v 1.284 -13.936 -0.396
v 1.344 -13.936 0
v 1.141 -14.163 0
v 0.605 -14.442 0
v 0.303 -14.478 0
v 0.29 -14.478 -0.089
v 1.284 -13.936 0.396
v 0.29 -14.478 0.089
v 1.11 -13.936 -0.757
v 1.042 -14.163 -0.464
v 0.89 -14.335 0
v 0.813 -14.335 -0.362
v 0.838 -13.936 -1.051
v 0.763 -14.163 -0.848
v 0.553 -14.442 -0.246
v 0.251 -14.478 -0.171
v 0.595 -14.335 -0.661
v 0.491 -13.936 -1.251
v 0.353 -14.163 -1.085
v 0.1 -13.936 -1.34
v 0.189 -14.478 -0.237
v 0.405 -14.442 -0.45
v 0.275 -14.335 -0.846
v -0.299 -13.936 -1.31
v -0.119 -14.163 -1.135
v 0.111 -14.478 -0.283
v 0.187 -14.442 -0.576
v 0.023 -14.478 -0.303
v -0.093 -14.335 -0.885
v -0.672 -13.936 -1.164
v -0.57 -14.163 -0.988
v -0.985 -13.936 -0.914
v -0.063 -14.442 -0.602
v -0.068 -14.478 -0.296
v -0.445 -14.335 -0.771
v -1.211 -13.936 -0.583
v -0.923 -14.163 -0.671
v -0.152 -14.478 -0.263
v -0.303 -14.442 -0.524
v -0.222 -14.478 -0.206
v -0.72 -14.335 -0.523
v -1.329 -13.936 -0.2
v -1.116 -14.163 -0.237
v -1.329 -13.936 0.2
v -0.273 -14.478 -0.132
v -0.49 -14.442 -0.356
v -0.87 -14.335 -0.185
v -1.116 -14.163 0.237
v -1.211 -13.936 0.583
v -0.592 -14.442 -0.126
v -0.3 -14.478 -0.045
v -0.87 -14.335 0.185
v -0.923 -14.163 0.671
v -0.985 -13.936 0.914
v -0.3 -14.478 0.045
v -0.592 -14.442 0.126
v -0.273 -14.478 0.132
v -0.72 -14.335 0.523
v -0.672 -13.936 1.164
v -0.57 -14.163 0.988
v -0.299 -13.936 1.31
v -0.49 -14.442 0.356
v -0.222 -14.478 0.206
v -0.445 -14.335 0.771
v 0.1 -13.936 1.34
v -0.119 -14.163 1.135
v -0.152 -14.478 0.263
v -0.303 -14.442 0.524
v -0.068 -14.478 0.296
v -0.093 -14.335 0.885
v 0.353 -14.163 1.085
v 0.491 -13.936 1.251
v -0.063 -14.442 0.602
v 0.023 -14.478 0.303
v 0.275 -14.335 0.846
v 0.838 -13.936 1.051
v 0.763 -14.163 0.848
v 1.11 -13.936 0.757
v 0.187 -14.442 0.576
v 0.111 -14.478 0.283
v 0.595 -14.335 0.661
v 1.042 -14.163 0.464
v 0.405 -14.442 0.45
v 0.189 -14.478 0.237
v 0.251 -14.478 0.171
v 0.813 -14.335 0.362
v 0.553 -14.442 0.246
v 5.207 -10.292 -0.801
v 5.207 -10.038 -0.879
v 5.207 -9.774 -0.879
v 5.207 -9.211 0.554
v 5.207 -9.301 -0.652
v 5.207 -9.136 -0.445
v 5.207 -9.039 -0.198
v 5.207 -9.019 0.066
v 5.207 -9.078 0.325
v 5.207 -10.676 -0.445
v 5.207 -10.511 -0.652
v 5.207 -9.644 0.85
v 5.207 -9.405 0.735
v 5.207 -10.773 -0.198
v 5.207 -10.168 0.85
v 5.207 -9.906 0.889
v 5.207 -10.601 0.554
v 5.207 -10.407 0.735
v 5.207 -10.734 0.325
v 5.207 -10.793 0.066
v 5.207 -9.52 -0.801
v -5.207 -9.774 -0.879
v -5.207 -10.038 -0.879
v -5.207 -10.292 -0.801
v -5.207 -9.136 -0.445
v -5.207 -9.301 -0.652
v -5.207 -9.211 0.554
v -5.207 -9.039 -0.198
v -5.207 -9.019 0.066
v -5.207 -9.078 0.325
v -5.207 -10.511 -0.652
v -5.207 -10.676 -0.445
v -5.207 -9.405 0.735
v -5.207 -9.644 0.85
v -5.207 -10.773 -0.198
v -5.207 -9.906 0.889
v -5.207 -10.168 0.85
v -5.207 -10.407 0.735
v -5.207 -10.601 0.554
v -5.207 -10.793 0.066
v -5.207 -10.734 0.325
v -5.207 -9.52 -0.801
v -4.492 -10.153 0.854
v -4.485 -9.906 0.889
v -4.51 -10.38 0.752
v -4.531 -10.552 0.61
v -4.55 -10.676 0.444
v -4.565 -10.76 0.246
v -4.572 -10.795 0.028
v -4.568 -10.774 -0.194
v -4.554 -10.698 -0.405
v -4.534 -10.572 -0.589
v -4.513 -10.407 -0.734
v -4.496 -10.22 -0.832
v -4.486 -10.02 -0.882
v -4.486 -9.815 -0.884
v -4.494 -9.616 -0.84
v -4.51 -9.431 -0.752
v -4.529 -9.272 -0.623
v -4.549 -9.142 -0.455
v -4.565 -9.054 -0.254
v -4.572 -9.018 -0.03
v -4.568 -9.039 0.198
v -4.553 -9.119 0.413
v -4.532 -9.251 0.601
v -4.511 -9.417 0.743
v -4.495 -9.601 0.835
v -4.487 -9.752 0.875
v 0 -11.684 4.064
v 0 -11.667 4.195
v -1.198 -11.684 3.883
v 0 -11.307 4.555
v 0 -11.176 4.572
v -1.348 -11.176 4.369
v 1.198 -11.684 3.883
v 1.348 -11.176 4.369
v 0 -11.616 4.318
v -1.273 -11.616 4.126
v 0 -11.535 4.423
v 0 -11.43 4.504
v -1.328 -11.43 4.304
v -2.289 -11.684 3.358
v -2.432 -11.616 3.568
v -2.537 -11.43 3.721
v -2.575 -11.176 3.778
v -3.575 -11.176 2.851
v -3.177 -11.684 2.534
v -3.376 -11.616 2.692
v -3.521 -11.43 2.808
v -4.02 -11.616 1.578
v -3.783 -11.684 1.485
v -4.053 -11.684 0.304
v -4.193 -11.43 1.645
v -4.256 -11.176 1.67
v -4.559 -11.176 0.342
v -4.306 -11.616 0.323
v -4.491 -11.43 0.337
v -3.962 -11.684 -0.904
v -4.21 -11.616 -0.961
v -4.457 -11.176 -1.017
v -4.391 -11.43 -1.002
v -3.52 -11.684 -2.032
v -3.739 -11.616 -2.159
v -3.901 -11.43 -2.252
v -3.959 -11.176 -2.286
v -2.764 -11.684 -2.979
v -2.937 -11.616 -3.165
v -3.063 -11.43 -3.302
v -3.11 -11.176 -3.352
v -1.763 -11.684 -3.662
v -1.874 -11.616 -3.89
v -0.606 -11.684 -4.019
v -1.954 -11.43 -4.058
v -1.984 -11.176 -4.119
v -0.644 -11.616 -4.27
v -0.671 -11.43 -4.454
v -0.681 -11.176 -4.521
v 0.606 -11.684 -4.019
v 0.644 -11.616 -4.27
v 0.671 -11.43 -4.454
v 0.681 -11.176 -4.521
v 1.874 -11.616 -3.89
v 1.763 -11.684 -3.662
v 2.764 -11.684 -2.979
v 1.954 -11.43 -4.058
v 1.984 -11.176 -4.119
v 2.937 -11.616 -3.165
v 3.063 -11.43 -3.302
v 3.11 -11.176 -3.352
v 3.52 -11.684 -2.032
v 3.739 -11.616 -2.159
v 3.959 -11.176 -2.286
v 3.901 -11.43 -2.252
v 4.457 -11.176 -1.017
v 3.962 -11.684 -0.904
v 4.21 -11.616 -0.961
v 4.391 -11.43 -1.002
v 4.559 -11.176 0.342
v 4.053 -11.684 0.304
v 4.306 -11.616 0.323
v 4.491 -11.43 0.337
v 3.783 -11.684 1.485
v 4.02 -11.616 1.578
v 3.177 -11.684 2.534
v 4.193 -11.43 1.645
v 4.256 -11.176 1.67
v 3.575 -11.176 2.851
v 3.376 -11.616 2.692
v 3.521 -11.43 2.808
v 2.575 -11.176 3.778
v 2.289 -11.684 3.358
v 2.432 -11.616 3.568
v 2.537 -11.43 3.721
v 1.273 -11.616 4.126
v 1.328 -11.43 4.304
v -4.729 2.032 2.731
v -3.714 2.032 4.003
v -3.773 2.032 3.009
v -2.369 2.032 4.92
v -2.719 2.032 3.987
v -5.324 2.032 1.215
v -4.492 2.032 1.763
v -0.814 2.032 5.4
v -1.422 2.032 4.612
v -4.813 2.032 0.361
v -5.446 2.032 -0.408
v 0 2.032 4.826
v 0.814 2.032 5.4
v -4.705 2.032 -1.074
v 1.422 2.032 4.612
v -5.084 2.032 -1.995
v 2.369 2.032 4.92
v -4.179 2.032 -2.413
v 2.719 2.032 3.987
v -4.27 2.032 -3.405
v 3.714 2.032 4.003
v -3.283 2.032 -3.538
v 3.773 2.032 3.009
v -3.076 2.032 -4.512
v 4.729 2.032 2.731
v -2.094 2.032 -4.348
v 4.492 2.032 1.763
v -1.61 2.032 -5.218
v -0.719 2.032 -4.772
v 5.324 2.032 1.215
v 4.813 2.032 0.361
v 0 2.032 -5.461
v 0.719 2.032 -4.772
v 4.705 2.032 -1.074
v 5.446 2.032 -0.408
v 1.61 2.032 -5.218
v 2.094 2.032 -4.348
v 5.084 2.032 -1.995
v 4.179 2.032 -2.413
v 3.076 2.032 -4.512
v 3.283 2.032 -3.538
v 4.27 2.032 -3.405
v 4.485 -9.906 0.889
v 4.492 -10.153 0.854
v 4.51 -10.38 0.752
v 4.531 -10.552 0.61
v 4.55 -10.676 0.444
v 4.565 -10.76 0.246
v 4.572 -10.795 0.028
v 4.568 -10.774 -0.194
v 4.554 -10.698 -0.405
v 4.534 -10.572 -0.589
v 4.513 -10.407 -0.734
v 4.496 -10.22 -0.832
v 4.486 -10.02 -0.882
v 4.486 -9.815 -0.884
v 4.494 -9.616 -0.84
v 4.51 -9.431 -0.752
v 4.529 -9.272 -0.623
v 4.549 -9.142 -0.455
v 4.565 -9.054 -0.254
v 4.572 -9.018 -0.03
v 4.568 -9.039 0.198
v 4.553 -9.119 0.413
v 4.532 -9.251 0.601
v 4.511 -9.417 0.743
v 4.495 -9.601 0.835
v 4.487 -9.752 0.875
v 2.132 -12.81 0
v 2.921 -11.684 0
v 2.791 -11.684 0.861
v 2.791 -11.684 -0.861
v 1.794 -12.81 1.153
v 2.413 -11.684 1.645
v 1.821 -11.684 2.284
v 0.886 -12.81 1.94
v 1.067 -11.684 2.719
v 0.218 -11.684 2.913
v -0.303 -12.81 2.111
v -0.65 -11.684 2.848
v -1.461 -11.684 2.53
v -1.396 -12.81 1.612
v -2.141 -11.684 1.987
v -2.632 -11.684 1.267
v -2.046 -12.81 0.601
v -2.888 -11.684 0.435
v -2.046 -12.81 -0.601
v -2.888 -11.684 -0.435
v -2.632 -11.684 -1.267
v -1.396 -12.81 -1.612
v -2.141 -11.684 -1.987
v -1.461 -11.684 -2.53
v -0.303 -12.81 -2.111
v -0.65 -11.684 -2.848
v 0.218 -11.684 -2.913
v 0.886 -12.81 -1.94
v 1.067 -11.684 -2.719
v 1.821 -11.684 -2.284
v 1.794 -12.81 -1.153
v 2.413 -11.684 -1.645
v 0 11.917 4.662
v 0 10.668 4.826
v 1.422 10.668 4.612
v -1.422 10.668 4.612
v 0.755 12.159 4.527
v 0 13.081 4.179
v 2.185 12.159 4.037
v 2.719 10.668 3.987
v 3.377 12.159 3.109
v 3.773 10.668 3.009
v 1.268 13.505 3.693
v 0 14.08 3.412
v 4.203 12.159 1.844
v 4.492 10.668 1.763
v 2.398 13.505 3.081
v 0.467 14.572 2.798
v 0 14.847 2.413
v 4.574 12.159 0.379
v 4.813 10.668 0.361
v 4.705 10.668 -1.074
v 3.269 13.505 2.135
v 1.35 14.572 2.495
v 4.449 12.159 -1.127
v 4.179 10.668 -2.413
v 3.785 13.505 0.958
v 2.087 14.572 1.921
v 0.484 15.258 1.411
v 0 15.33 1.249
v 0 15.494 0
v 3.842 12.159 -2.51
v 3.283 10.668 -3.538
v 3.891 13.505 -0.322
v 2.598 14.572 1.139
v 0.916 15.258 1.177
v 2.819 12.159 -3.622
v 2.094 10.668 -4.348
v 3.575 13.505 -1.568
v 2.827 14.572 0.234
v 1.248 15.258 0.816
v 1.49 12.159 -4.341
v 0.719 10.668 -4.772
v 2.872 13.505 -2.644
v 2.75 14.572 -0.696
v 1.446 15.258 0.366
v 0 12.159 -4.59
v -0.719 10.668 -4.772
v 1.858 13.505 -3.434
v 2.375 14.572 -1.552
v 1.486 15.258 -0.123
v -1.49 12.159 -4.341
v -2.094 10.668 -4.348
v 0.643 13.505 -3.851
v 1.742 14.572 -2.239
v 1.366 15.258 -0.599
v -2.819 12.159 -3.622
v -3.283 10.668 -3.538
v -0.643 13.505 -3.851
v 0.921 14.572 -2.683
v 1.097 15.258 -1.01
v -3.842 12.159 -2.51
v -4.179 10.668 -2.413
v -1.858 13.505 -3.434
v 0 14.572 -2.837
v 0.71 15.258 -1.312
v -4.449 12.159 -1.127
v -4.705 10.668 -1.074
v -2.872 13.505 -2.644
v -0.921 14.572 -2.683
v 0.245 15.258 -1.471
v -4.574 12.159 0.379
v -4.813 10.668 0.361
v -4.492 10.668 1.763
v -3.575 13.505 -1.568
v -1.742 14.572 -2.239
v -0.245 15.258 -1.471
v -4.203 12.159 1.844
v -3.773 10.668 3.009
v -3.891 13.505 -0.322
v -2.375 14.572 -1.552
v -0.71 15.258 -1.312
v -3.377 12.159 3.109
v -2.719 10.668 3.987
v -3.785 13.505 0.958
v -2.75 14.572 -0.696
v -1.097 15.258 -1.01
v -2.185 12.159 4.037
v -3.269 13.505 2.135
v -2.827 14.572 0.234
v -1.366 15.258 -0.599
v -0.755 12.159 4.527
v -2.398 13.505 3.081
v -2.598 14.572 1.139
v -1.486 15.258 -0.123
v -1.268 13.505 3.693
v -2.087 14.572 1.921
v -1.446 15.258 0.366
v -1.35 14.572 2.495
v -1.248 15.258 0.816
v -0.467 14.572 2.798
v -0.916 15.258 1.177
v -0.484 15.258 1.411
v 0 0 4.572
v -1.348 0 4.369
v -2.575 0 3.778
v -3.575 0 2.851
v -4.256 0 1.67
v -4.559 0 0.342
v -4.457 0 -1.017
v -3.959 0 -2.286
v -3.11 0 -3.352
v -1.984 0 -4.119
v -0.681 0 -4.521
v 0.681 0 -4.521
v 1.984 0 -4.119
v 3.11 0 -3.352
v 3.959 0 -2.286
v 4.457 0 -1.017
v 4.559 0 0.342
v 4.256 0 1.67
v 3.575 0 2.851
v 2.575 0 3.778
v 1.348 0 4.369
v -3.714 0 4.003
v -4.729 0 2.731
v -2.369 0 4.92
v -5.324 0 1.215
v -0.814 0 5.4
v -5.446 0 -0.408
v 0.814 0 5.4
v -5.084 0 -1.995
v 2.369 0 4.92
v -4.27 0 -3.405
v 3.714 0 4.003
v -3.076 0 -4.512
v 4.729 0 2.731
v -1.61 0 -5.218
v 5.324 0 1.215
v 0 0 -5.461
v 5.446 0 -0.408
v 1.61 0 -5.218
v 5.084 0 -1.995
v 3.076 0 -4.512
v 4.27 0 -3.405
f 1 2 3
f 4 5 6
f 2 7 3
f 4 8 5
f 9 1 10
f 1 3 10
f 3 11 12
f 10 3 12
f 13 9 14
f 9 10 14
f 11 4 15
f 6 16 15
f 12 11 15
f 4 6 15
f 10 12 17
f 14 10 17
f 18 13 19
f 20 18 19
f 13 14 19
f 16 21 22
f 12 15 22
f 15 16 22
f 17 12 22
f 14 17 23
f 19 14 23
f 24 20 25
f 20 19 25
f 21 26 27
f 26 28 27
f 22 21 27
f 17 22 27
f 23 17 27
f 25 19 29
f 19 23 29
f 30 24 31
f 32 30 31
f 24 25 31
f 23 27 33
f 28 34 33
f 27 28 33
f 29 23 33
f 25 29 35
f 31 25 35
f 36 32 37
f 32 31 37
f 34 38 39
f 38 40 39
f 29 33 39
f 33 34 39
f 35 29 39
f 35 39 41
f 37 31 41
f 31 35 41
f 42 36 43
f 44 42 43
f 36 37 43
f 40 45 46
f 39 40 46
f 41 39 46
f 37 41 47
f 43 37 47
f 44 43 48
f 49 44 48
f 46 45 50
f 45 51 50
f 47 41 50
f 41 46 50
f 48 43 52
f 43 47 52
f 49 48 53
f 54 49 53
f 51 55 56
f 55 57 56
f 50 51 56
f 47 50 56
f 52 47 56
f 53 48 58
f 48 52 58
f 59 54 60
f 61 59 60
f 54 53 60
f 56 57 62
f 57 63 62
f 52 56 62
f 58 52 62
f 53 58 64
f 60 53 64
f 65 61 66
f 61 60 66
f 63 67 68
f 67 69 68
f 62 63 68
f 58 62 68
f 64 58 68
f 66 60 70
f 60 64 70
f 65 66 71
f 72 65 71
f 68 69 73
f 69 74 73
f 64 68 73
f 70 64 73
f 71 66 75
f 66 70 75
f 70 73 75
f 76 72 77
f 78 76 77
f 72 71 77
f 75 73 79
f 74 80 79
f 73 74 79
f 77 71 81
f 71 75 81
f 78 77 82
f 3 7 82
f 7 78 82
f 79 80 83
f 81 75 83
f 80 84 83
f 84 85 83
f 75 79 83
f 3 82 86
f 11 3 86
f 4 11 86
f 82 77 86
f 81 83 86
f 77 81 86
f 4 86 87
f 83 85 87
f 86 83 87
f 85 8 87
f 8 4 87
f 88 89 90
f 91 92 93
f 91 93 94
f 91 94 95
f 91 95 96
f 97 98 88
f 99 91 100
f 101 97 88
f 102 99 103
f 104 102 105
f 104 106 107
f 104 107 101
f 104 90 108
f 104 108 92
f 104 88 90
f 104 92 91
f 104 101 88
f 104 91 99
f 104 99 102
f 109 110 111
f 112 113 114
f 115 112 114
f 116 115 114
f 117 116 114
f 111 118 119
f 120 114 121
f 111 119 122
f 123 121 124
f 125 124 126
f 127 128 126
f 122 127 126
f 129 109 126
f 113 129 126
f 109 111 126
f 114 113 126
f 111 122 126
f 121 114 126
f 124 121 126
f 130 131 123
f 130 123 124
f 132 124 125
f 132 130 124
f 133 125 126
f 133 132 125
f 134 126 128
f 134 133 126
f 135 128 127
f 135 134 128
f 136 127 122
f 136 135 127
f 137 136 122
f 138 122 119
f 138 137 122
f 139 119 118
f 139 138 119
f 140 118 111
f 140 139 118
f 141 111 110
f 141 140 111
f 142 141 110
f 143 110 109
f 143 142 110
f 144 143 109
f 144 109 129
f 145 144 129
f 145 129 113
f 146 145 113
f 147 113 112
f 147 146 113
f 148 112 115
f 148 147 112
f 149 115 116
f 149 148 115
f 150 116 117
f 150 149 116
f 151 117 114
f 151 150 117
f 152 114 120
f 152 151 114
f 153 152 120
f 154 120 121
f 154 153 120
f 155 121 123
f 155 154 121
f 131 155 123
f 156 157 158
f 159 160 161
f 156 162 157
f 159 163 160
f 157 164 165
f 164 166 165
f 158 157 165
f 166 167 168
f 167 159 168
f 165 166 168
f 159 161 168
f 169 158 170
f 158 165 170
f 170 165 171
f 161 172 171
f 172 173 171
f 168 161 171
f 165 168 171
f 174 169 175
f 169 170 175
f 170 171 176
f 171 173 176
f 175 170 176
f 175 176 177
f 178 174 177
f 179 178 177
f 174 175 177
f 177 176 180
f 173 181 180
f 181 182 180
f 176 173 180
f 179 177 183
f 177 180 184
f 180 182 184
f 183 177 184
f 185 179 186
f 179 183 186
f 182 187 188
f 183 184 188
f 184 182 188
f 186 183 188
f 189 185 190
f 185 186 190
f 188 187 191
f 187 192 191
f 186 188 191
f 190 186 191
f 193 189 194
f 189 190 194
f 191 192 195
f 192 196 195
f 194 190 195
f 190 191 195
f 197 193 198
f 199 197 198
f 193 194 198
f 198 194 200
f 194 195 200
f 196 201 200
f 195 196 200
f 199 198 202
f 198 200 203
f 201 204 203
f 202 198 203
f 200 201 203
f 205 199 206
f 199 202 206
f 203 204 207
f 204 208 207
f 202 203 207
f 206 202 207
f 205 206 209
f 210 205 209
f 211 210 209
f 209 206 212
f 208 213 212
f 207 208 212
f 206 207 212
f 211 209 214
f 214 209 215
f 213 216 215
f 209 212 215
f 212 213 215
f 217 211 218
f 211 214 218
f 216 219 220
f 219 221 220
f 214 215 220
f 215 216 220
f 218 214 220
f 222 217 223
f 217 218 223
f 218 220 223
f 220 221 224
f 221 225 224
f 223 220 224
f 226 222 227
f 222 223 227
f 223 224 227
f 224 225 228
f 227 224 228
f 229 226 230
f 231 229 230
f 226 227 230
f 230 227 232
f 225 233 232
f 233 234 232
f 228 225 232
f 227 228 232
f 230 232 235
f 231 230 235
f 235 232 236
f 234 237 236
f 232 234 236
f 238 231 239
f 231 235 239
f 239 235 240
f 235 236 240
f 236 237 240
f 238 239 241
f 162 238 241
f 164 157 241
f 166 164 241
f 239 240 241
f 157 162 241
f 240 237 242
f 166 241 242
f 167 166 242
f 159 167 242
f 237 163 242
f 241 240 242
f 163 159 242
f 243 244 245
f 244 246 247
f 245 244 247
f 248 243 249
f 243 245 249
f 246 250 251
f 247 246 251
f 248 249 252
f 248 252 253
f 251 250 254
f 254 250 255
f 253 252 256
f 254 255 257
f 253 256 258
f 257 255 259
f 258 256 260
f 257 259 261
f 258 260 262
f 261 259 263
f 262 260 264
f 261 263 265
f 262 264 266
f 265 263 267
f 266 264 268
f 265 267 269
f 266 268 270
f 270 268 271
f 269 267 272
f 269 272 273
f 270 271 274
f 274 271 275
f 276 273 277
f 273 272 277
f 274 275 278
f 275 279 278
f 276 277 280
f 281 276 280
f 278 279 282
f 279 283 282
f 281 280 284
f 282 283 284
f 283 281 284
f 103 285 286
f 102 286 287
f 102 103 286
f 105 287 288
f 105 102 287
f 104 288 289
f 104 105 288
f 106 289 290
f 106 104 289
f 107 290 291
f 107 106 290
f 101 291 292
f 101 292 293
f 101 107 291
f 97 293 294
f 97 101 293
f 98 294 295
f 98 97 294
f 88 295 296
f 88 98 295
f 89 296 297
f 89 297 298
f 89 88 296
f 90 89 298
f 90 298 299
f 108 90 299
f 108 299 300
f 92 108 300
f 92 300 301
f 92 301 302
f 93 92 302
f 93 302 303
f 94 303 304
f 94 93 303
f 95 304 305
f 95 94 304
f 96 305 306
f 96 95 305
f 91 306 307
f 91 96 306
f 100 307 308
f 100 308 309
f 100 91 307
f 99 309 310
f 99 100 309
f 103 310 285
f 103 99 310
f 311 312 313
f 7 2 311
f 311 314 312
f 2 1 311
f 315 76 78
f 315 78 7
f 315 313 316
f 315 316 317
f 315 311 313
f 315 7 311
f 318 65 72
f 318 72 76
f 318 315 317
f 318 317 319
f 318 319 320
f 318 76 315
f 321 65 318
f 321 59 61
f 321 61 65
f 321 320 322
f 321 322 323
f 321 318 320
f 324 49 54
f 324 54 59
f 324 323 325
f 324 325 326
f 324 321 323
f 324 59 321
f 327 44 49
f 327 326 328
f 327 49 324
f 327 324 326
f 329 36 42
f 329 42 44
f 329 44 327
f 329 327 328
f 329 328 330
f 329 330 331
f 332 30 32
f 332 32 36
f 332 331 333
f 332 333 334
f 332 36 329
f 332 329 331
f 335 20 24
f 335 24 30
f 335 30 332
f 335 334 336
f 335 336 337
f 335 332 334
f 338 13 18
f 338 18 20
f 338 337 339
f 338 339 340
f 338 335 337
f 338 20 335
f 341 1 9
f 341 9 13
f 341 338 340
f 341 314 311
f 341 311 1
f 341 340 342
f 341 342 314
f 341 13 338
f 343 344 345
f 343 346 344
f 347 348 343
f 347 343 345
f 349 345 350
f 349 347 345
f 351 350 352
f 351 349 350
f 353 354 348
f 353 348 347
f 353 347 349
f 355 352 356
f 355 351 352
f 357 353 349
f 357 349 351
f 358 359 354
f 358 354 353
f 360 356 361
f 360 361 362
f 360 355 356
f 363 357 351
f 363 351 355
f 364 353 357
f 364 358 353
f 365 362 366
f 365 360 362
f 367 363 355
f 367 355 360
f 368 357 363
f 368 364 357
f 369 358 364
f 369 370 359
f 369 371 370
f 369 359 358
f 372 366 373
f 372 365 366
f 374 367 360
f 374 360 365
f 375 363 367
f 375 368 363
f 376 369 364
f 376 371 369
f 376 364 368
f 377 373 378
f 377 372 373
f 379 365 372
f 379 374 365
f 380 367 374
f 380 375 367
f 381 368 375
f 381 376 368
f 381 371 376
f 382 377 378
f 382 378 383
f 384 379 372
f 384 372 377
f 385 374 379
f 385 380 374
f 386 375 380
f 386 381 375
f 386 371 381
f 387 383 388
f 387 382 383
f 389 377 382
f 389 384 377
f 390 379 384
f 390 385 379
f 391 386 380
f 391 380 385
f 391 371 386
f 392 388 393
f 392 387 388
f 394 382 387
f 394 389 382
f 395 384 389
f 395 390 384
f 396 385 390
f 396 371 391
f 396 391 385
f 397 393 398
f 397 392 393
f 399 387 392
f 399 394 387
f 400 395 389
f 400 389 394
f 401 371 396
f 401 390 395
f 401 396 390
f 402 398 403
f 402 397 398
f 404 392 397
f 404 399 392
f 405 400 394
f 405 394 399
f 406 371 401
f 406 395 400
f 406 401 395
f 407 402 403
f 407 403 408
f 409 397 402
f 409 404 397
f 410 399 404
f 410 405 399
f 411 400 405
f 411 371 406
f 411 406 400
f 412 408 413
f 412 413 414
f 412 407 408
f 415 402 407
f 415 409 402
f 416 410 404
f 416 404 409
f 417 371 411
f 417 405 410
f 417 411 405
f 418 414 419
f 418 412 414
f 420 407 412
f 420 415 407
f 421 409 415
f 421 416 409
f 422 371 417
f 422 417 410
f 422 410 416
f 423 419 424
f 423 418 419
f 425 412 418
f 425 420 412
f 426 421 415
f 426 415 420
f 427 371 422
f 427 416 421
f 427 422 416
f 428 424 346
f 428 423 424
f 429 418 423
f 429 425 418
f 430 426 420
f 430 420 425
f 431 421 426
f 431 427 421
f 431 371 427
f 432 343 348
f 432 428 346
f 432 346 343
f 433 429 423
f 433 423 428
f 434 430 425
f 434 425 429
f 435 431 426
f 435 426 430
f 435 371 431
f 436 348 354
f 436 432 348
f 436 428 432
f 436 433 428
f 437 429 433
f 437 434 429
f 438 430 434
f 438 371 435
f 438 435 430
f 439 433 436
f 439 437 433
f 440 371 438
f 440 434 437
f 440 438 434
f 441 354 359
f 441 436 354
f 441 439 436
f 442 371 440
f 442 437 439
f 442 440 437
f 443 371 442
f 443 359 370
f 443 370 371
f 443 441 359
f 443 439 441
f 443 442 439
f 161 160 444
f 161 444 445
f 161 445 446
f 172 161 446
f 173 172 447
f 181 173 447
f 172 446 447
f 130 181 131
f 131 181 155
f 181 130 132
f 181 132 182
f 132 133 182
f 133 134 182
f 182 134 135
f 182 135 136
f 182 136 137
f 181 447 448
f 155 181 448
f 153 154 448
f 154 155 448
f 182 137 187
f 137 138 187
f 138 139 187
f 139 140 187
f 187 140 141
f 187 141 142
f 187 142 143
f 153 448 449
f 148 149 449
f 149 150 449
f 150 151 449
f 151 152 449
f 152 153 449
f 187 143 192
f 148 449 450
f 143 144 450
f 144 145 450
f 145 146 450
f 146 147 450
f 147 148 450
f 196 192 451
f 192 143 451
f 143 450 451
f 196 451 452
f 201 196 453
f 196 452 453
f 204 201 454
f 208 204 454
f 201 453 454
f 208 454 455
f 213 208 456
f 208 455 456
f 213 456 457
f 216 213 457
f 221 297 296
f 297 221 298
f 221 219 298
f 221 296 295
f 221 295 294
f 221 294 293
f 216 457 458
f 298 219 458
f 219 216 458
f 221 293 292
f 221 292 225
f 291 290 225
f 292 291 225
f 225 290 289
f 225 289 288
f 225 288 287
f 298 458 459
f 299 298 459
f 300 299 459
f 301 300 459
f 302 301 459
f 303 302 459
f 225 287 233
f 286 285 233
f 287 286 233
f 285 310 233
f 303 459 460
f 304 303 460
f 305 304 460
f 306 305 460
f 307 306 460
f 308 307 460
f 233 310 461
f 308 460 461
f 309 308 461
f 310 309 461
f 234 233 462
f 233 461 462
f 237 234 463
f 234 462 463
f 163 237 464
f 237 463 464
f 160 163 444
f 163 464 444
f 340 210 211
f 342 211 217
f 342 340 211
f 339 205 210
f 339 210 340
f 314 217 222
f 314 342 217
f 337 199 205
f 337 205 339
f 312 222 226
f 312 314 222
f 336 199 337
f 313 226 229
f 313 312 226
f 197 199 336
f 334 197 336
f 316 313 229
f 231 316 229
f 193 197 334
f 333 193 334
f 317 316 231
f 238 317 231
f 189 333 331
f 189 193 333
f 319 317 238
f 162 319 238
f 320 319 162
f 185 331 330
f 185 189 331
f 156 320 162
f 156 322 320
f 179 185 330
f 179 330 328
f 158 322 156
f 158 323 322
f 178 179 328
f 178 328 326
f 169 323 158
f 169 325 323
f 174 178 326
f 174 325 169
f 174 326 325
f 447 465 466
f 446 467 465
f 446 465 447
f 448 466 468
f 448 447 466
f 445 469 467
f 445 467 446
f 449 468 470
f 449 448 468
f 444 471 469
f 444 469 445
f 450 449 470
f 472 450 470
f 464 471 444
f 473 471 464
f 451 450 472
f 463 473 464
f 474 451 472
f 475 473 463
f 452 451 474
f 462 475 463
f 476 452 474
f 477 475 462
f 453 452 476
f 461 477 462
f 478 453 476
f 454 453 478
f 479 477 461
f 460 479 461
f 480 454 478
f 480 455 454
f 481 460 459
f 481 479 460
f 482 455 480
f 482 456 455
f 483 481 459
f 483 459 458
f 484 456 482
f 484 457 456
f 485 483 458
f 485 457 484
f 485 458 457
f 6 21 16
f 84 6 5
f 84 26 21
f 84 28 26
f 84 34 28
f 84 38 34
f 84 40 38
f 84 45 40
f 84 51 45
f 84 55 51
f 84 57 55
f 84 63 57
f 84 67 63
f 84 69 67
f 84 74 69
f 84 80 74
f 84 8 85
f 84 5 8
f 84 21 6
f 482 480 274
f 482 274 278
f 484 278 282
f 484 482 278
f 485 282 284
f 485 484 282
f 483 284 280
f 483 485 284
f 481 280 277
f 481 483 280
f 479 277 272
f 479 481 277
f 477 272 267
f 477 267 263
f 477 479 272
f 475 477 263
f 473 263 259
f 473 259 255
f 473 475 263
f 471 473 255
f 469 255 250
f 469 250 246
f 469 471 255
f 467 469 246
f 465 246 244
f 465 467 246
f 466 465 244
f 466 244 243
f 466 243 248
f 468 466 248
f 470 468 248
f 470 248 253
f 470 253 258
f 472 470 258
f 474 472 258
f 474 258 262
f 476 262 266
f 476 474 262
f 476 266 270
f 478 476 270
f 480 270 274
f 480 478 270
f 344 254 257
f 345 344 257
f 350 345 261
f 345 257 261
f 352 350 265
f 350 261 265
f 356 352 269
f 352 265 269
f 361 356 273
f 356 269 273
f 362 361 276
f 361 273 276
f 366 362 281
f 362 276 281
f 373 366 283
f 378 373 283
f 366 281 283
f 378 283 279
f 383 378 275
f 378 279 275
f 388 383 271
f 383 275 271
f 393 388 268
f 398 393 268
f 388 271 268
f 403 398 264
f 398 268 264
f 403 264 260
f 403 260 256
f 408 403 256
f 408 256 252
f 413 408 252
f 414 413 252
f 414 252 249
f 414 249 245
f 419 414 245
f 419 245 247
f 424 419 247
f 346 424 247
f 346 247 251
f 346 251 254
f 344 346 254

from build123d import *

# Parameters (mm, degrees)
SKETCH2_R           = 4.826
BOSS_EXTRUDE1_DEPTH = 15.494
FILLET1_R           = 4.826
SKETCH3_R           = 5.461
BOSS_EXTRUDE2_DEPTH = 2.032
SKETCH4_R           = 4.572
BOSS_EXTRUDE3_DEPTH = 11.684
SKETCH5_R           = 2.921
BOSS_EXTRUDE4_DEPTH = 2.794
BOSS_EXTRUDE4_TAPER = 35
FILLET2_R           = 1.27
FILLET3_R           = 0.508
SKETCH6_R           = 0.889
BOSS_EXTRUDE5_DEPTH = 5.207


with BuildPart() as part:
    # Sketch2 → Boss-Extrude1 (new body)
    with BuildSketch(Plane(origin=(0, 0, 0), x_dir=(1, 0, 0), z_dir=(0, 1, 0))):
        with Locations(Location((0, 0, 0), (0, 0, 270))):  # turned: the seam where the file's is
            Circle(SKETCH2_R)
    extrude(amount=BOSS_EXTRUDE1_DEPTH)

    # Fillet1
    fillet1_edges = [part.edges().sort_by_distance(p)[0] for p in [
        (0, 15.494, -4.826),
    ]]
    fillet(fillet1_edges, radius=FILLET1_R)

    # Sketch3 → Boss-Extrude2 (add)
    with BuildSketch(Plane.XZ):
        with Locations(Location((0, 0, 0), (0, 0, 270))):  # turned: the seam where the file's is
            Circle(SKETCH3_R)
    extrude(amount=-BOSS_EXTRUDE2_DEPTH)

    # Sketch4 → Boss-Extrude3 (add)
    with BuildSketch(Plane.XZ):
        with Locations(Location((0, 0, 0), (0, 0, 90))):  # turned: the seam where the file's is
            Circle(SKETCH4_R)
    extrude(amount=BOSS_EXTRUDE3_DEPTH)

    # Sketch5 → Boss-Extrude4 (add)
    with BuildSketch(Plane.XZ.offset(11.684)):
        Circle(SKETCH5_R)
    extrude(amount=BOSS_EXTRUDE4_DEPTH, taper=BOSS_EXTRUDE4_TAPER)

    # Fillet2
    fillet2_edges = [part.edges().sort_by_distance(p)[0] for p in [
        (-0.964620138, -14.478, 0),
    ]]
    fillet(fillet2_edges, radius=FILLET2_R)

    # Fillet3
    fillet3_edges = [part.edges().sort_by_distance(p)[0] for p in [
        (0, -11.684, -4.572),
    ]]
    fillet(fillet3_edges, radius=FILLET3_R)

    # Sketch6 → Boss-Extrude5 (add, symmetric)
    with BuildSketch(Plane(origin=(0, 0, 0), x_dir=(0, 0, -1), z_dir=(1, 0, 0))):
        with Locations(Location((0, -9.906, 0), (0, 0, 180))):  # turned: the seam where the file's is
            Circle(SKETCH6_R)
    extrude(amount=BOSS_EXTRUDE5_DEPTH, both=True)


solid = part.part
